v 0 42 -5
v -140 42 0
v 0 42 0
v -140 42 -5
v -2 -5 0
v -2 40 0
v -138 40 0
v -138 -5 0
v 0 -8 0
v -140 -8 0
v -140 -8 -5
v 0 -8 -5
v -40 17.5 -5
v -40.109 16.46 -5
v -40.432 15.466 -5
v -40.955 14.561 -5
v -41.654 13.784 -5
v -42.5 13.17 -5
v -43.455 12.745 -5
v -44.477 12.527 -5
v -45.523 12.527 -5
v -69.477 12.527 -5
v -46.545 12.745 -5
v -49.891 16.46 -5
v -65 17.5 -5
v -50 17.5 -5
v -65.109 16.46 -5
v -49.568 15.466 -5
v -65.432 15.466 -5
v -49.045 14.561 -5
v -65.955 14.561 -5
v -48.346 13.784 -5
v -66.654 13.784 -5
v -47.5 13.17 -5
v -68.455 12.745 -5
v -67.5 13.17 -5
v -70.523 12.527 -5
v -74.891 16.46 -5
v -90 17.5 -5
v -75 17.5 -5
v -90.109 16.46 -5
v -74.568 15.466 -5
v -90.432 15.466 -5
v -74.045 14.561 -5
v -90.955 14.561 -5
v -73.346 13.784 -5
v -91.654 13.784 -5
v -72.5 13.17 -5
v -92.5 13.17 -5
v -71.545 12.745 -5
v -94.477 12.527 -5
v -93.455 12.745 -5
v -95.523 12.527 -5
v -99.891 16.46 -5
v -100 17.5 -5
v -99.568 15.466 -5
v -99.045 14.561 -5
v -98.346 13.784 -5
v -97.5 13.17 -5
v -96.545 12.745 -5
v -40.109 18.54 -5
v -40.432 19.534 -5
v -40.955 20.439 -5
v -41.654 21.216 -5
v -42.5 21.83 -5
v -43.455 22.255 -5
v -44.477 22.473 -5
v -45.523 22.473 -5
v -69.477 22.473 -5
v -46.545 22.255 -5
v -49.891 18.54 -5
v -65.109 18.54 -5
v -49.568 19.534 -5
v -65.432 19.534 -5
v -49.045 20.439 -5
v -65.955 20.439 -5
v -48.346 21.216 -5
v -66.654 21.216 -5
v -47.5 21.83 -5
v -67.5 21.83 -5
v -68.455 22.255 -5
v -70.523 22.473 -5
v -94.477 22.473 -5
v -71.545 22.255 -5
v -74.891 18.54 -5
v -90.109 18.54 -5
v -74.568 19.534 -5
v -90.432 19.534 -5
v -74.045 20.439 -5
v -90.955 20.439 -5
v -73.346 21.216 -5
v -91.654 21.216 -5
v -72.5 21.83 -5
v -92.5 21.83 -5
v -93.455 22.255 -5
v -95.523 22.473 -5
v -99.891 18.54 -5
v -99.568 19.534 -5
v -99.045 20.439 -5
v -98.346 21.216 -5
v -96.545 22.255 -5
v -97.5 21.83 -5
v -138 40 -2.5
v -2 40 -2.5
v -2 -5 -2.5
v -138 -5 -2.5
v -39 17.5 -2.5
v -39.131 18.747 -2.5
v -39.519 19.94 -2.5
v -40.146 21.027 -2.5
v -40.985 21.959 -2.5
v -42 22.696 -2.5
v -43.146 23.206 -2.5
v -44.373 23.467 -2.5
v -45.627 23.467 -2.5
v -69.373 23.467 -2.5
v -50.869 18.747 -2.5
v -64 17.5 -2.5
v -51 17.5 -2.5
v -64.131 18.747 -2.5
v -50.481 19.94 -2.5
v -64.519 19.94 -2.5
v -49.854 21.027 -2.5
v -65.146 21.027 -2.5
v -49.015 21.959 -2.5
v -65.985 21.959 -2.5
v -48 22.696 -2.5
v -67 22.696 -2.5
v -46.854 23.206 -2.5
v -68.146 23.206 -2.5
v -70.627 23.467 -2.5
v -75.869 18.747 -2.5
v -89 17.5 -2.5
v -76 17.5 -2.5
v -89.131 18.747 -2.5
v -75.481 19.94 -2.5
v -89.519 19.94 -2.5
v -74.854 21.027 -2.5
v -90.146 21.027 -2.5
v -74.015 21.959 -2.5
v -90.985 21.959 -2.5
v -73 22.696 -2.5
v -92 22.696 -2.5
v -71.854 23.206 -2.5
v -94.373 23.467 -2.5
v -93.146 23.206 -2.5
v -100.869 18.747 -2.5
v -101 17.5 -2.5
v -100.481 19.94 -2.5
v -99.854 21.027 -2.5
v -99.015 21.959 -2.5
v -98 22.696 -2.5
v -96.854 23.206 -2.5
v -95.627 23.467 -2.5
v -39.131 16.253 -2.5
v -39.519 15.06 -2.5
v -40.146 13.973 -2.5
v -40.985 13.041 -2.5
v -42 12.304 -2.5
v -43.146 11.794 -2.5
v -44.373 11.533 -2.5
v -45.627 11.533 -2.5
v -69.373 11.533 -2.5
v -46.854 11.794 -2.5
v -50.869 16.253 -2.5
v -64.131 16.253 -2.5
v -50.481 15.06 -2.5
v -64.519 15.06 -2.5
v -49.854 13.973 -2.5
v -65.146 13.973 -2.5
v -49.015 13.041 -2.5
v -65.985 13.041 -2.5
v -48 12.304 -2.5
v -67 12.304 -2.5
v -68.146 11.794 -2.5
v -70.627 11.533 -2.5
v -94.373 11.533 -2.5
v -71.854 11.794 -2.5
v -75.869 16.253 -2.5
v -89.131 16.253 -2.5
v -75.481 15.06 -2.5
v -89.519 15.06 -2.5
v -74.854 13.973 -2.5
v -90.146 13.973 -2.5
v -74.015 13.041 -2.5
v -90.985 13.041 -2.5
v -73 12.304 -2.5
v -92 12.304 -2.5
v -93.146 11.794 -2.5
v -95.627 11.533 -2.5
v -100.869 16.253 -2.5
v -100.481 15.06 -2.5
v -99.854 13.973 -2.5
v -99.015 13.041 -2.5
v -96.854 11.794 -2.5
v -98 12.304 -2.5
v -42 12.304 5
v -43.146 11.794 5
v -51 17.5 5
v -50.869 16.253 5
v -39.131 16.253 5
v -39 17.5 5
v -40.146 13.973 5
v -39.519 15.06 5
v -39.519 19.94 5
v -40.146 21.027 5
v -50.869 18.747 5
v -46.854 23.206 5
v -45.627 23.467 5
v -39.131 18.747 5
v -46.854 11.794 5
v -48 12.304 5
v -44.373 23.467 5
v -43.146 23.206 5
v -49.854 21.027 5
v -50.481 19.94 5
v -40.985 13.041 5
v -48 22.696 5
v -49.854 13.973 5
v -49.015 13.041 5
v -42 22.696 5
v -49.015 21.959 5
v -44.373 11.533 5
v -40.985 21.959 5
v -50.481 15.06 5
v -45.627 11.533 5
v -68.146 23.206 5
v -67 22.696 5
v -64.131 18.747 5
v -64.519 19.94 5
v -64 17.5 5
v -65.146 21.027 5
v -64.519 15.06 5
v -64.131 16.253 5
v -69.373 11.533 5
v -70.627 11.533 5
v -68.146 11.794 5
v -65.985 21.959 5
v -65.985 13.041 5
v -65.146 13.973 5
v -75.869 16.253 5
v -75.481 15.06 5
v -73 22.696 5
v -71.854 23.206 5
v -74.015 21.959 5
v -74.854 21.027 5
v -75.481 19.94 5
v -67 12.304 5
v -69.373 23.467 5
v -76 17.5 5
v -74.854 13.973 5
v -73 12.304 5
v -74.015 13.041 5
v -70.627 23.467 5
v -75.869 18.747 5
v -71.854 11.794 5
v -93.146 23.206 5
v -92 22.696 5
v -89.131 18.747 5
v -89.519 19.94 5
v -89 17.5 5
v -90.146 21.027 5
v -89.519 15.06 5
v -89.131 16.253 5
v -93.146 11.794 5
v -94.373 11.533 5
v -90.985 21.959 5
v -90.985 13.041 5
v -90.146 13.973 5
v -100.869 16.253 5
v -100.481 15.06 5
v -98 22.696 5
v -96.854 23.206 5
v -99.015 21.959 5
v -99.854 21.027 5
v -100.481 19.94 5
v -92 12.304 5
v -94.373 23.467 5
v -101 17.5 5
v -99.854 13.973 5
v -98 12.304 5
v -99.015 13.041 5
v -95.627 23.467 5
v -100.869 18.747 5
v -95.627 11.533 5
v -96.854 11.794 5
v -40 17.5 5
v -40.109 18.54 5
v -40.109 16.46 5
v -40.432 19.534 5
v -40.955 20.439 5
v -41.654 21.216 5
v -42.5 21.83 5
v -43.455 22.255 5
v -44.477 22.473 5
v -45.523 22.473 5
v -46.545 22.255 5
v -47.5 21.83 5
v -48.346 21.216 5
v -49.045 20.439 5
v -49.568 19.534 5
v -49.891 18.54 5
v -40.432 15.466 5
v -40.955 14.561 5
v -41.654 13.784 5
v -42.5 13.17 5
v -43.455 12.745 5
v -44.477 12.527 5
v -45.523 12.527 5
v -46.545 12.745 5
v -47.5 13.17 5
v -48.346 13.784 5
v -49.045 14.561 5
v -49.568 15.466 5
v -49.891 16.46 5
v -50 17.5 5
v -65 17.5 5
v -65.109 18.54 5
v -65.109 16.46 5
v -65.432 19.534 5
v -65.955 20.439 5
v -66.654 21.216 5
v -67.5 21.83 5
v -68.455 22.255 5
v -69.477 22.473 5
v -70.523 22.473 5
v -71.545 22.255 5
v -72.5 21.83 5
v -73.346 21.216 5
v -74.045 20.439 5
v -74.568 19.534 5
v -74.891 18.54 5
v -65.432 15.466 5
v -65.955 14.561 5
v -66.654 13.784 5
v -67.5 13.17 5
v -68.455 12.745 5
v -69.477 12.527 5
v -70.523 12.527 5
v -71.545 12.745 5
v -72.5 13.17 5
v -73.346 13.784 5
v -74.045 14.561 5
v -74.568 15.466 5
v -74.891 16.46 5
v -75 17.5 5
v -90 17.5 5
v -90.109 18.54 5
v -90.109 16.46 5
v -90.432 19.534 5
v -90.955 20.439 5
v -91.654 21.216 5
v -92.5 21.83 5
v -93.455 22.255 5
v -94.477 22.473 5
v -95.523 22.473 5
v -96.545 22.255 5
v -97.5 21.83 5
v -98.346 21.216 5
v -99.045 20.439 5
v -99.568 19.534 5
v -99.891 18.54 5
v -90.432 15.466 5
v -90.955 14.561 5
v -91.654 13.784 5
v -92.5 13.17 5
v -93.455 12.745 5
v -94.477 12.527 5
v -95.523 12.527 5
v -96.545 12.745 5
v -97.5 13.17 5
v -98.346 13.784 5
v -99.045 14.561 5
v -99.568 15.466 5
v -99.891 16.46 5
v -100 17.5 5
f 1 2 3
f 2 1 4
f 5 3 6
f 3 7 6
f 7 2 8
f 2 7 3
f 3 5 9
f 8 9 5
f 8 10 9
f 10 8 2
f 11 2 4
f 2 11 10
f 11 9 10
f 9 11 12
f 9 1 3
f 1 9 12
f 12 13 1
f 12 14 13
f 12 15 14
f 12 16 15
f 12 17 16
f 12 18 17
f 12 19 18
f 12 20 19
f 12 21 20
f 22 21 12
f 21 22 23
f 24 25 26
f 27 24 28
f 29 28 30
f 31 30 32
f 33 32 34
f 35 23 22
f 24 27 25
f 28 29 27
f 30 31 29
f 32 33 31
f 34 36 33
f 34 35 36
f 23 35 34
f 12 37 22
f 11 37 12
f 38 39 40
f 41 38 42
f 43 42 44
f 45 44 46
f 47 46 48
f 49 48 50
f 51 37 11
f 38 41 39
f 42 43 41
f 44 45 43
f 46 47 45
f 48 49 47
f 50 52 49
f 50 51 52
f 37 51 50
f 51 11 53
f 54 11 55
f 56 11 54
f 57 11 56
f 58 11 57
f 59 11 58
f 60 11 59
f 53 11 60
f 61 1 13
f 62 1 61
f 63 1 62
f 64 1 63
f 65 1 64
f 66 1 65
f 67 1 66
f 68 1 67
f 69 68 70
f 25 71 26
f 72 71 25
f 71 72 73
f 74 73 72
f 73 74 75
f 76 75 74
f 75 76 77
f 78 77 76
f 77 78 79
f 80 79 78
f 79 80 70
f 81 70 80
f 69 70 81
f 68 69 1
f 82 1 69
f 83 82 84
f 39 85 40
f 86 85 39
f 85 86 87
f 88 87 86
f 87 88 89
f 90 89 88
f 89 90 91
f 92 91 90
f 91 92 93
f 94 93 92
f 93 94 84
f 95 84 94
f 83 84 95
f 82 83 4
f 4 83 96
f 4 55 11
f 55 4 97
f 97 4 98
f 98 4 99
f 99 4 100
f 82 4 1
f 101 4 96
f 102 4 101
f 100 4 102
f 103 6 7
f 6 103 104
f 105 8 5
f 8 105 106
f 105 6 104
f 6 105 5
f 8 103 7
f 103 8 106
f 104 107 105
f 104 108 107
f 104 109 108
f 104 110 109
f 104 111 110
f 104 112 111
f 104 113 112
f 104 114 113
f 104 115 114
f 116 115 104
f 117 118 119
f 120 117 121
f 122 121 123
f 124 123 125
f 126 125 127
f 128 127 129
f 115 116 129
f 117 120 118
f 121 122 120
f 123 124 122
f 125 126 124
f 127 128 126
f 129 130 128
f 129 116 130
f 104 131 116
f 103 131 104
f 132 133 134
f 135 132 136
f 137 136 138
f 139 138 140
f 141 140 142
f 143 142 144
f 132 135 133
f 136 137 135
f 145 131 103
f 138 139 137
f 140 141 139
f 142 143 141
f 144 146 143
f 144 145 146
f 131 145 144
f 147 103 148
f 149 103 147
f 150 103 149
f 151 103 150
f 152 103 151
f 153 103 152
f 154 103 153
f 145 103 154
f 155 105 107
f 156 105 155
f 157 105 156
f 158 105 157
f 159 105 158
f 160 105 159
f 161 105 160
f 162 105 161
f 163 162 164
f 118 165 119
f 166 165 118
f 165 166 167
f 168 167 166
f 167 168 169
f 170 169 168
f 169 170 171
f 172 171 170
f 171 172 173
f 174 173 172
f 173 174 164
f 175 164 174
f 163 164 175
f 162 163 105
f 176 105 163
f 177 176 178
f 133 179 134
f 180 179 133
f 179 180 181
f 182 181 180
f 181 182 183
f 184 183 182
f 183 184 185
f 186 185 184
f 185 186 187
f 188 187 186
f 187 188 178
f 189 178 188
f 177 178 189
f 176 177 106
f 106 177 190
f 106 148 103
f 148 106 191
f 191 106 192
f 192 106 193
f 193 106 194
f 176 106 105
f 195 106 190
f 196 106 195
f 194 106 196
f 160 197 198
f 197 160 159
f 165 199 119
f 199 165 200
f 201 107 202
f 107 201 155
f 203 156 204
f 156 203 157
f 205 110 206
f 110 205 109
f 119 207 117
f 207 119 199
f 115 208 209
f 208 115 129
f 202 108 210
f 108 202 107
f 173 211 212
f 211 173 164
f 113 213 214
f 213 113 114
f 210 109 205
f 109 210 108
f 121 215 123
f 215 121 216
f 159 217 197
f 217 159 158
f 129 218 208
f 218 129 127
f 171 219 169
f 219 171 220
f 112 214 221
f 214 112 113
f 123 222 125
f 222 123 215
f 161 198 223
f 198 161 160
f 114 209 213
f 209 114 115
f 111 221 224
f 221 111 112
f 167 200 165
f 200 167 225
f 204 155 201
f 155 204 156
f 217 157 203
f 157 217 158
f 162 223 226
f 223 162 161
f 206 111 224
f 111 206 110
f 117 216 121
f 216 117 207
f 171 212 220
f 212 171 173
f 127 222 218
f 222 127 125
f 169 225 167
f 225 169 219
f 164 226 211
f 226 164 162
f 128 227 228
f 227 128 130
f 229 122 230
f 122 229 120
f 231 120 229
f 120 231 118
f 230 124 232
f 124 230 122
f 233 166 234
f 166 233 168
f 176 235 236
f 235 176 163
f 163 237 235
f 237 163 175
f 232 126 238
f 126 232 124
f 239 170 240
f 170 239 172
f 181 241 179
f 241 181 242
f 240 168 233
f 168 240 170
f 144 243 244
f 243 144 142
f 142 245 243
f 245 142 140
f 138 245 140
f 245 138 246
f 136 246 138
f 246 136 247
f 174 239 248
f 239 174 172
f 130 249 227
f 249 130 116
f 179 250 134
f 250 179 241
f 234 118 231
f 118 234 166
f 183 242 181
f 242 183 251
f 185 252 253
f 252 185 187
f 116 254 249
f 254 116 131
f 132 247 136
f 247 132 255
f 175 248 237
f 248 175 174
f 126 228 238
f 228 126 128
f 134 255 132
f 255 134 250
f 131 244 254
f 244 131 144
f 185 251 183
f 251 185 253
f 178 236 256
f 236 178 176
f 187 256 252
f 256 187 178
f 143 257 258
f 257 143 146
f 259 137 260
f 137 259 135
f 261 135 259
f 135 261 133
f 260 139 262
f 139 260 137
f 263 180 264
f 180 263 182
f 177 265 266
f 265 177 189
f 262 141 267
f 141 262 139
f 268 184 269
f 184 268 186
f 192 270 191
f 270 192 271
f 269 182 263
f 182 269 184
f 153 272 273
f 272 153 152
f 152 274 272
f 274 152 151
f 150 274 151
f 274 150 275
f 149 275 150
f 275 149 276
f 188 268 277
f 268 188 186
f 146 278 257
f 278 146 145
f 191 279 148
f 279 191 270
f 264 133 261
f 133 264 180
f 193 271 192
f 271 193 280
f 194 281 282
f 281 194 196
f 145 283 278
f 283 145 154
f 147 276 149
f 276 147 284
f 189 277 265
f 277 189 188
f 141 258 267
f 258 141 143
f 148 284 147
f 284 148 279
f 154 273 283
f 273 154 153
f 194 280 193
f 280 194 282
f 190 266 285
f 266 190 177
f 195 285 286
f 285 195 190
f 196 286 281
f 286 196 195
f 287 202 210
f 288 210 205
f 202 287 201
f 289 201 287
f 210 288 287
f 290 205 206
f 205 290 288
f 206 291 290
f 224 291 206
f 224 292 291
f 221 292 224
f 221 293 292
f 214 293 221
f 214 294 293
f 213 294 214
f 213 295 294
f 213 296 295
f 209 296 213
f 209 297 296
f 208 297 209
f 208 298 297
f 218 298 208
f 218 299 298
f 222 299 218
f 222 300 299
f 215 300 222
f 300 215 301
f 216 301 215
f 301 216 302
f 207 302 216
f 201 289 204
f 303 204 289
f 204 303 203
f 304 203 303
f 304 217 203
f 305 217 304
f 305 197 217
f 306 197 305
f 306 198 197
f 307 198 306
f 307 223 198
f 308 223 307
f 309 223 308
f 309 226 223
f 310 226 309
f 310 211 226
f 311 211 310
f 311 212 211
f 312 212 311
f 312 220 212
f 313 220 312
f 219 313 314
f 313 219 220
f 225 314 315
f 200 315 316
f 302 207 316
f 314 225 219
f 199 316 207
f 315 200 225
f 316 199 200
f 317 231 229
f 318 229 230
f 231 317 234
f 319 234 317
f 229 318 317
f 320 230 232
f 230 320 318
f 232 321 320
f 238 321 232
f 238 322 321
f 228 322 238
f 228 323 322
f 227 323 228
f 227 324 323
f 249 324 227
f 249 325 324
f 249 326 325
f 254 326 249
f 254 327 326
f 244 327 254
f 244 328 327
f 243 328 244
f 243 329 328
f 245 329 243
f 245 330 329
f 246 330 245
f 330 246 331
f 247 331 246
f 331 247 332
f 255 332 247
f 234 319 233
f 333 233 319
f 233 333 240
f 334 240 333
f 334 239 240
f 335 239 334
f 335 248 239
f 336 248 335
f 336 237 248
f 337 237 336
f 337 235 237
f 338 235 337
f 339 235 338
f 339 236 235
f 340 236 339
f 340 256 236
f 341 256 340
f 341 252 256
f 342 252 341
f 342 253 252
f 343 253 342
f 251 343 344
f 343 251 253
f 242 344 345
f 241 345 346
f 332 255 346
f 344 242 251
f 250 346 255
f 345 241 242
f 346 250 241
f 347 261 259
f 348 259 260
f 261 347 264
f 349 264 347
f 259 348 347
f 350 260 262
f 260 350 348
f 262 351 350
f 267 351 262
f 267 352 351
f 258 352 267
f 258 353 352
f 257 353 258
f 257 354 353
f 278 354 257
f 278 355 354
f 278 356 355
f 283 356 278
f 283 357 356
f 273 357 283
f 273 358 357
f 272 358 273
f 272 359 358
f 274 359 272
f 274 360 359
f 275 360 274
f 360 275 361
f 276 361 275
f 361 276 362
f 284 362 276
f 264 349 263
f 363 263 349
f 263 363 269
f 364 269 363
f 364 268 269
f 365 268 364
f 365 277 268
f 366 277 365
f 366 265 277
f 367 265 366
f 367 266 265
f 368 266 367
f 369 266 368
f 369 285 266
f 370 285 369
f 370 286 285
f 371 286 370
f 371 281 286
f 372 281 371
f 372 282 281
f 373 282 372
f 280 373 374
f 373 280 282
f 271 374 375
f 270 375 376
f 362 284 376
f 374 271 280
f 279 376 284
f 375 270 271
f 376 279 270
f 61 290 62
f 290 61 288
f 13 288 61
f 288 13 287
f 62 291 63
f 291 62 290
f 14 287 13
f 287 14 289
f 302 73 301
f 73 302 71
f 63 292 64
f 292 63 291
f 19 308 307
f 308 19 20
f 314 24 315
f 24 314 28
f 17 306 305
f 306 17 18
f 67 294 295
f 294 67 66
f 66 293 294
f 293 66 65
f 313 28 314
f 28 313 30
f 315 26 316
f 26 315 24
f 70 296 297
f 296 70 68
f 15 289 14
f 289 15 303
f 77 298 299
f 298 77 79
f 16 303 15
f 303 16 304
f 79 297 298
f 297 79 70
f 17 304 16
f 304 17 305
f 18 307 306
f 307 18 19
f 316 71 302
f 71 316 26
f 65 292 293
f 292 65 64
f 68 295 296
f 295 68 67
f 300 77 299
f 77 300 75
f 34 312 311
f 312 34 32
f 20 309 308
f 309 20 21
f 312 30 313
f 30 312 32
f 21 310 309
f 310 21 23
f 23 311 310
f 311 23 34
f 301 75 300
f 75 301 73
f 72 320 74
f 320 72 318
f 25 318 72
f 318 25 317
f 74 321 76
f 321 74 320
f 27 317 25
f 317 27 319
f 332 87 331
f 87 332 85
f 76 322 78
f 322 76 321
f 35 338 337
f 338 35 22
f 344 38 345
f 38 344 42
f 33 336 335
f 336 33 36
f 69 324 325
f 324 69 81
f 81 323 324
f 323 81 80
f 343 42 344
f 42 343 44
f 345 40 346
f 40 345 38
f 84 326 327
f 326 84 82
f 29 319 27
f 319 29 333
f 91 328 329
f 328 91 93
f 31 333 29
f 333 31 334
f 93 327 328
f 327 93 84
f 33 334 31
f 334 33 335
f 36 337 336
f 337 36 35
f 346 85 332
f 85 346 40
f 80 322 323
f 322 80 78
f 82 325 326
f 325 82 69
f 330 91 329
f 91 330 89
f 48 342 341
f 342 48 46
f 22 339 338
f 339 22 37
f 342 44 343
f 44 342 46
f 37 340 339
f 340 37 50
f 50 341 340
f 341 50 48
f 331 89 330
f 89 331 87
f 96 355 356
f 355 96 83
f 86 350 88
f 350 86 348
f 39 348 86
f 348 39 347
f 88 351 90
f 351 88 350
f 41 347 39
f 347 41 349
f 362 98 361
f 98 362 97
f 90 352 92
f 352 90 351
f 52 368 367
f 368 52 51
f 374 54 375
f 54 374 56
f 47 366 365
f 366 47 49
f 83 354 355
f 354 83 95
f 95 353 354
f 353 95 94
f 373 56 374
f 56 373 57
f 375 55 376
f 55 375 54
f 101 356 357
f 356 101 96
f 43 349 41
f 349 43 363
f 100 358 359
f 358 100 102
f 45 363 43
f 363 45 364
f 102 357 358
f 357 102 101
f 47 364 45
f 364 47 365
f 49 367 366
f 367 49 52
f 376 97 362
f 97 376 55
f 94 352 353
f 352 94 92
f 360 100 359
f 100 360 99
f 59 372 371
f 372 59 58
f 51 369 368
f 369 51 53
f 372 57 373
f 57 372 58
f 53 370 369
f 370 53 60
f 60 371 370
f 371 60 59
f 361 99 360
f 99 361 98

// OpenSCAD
difference() {

    difference() {
     
        
        rotate([0,90,90])
        translate([0,0,-8])
            cube([5,140,50]);
        
        rotate([0,90,90])
        translate([0,2,-5])
            cube([2.5,136,45]);
        
            
    }


    union() {
        translate ([-45,17.5,-50])
        color("blue")
        cylinder ( h = 150, r = 6, $fn = 30);

        translate ([-70,17.5,-50])
        color("blue")
        cylinder ( h = 150, r = 6, $fn = 30);

        translate ([-95,17.5,-50])
        color("blue")
        cylinder ( h = 150, r = 6, $fn = 30);
        
    }


}





translate([0,0,45])
difference () {
   
   
   union () { 
        translate ([-45,17.5,-50])
        color("blue")
        cylinder ( h = 10, r = 6, $fn = 30);

        translate ([-70,17.5,-50])
        color("blue")
        cylinder ( h = 10, r = 6, $fn = 30);

        translate ([-95,17.5,-50])
        color("blue")
        cylinder ( h = 10, r = 6, $fn = 30);        
    }


    union() {
        translate ([-45,17.5,-50])
        color("blue")
        cylinder ( h = 10, r = 5, $fn = 30);

        translate ([-70,17.5,-50])
        color("blue")
        cylinder ( h = 10, r = 5, $fn = 30);

        translate ([-95,17.5,-50])
        color("blue")
        cylinder ( h = 10, r = 5, $fn = 30);
    }
    
    
}
